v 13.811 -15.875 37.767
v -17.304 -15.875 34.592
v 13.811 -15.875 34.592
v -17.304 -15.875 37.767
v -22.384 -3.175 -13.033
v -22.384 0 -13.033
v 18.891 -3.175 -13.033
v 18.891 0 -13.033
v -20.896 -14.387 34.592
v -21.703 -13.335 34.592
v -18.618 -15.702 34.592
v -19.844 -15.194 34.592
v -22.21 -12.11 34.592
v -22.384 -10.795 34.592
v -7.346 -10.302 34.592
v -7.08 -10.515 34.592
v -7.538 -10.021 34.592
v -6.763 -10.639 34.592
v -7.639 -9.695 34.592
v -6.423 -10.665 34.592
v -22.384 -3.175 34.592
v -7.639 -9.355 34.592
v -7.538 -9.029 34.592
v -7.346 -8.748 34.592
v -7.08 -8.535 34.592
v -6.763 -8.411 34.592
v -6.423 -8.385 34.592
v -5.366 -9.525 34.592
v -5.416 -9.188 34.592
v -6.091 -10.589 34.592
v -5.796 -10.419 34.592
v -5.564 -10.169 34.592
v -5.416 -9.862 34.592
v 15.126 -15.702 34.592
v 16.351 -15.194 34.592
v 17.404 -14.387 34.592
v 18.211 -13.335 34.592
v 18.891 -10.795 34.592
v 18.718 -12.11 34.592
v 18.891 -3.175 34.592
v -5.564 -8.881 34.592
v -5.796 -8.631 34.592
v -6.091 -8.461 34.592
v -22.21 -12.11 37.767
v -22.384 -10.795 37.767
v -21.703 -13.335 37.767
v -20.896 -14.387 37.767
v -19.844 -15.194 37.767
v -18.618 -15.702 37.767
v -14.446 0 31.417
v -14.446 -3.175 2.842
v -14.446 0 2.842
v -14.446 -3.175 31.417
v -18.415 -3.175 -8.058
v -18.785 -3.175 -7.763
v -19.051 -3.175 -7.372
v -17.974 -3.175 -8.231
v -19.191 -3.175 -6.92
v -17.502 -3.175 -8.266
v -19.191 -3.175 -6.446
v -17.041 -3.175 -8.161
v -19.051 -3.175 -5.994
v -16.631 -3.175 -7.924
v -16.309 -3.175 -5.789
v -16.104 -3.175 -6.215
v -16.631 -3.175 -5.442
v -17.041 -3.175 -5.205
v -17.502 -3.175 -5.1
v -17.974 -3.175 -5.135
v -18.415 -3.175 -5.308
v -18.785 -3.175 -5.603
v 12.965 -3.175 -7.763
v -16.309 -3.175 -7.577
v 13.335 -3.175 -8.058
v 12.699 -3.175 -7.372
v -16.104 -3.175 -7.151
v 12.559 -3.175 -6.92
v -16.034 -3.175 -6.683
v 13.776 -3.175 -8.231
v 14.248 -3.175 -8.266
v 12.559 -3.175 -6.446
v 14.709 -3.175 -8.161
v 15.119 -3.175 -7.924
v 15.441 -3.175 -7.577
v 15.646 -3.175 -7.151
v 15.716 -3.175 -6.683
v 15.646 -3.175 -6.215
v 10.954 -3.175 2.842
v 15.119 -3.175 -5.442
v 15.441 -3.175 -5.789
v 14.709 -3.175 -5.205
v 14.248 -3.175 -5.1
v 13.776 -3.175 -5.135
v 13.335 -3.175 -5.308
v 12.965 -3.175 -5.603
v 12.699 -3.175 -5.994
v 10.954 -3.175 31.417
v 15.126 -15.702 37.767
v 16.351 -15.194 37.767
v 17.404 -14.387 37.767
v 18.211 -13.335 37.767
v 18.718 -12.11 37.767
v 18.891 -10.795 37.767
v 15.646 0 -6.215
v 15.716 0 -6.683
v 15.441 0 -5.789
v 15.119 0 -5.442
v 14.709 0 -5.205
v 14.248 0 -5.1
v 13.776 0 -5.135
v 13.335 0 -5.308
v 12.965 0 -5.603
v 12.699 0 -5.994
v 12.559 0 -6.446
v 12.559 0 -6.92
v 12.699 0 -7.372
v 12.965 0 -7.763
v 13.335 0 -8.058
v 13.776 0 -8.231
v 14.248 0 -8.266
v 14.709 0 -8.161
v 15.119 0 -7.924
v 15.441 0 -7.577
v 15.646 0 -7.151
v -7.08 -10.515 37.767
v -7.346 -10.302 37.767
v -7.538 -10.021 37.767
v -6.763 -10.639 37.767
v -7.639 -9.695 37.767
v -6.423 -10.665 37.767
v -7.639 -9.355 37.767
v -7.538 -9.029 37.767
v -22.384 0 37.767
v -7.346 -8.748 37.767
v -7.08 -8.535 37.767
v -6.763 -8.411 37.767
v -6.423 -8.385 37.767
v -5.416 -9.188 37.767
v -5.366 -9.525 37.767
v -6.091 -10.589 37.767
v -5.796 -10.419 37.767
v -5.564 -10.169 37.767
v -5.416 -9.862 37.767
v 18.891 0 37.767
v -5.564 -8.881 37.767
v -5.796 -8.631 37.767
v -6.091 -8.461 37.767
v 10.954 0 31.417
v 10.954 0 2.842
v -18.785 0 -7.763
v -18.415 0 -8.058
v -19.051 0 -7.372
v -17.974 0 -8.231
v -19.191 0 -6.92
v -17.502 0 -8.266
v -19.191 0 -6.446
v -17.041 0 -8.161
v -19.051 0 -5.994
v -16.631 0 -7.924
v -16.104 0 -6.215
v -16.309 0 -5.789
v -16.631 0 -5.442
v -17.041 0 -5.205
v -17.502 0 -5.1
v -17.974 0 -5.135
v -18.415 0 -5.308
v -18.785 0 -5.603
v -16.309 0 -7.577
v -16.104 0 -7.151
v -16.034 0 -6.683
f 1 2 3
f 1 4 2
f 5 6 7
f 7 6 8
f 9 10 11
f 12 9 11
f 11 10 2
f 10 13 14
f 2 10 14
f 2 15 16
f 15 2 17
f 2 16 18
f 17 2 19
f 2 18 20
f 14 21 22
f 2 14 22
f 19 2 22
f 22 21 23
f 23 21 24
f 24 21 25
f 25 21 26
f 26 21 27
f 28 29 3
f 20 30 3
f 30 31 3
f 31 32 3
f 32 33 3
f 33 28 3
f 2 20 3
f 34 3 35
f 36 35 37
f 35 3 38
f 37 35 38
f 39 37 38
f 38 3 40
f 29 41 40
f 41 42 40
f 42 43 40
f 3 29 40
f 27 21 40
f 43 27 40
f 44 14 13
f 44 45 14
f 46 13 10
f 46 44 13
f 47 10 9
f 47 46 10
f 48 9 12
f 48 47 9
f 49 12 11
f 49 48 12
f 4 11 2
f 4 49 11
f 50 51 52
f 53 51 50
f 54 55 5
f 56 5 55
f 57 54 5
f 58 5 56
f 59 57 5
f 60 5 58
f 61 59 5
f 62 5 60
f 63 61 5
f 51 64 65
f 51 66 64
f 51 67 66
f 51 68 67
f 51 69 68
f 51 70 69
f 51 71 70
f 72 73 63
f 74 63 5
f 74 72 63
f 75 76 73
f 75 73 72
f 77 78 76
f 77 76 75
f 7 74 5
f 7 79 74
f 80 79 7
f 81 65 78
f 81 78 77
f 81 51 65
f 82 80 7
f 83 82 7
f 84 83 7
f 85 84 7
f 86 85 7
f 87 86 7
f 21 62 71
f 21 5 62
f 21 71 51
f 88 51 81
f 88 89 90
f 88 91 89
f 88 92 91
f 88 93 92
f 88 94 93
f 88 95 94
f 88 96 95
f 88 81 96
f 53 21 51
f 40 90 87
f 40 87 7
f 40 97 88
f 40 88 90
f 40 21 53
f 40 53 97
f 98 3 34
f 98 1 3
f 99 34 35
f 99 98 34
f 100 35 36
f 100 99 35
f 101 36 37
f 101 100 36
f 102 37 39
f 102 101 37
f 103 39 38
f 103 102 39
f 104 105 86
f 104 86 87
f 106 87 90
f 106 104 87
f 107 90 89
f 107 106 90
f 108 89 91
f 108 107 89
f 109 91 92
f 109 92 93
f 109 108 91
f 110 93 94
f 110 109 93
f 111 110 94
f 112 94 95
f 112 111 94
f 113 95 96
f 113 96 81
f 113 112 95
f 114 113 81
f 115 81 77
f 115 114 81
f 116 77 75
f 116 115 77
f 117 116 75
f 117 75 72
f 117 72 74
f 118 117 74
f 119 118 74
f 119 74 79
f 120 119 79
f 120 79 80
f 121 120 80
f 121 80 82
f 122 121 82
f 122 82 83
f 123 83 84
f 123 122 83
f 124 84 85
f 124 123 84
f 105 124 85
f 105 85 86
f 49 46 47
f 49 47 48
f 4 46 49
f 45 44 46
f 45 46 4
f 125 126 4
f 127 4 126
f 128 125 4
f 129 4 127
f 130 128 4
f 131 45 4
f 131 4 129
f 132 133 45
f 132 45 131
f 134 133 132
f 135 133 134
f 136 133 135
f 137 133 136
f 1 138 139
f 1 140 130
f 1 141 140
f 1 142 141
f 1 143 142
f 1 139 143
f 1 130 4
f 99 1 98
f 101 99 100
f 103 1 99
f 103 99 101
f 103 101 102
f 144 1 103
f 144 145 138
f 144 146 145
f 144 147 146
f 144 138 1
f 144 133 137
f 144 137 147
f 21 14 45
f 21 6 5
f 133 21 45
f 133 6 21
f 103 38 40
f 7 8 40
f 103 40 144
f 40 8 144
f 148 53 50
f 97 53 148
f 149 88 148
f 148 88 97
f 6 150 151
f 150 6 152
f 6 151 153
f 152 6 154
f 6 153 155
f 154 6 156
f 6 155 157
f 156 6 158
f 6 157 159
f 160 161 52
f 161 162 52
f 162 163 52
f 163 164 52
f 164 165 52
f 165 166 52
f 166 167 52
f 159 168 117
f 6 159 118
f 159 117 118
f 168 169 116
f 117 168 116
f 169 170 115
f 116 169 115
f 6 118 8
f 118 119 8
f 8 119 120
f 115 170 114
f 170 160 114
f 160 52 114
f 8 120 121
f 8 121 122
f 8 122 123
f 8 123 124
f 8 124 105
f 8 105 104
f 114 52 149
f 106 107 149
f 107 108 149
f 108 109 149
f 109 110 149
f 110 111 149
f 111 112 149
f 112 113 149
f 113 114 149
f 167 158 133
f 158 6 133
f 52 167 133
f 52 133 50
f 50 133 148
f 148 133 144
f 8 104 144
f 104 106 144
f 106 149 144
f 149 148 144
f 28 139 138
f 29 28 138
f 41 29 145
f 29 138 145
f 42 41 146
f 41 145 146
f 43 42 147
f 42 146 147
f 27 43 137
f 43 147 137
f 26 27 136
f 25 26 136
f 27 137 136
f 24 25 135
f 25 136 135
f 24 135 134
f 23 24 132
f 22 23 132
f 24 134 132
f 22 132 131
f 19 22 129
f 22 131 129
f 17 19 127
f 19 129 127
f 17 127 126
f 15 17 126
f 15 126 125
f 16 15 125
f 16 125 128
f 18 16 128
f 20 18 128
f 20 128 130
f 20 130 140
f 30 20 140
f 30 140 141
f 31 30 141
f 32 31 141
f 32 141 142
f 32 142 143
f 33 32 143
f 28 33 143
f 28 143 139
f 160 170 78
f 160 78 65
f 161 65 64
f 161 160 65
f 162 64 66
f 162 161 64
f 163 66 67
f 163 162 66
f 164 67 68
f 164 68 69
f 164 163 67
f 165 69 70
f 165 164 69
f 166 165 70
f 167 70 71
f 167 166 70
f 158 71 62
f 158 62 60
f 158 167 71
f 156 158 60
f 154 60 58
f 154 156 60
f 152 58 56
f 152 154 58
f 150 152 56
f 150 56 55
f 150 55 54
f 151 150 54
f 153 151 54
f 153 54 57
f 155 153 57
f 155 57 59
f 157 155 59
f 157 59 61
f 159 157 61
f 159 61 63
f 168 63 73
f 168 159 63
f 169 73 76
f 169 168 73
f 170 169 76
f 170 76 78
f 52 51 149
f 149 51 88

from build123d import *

# Parameters (mm, degrees)
F0_W     = 41.275
F0_H     = 50.8
F0_R     = 1.5875
F1_DEPTH = 3.175
F2_W     = 41.275
F2_H     = 3.175
F3_DEPTH = 12.7
F5_W     = 25.4
F5_H     = 28.575
F6_DEPTH = 3.175
F4_R     = 1.143
F7_DEPTH = 25.4
F8_R     = 5.08
F9_R     = 5.08


with BuildPart() as f1:
    # F0 (on Front) → F1 (new body)
    with BuildSketch(Plane.XZ):
        with Locations((-1.74602, 12.366909)):
            Rectangle(F0_W, F0_H)
        with Locations((-17.62102, -6.683091)):
            Circle(F0_R, mode=Mode.SUBTRACT)
        with Locations((14.12898, -6.683091)):
            Circle(F0_R, mode=Mode.SUBTRACT)
    extrude(amount=F1_DEPTH)

    # F2 (on face) → F3 (join)
    with BuildSketch(Plane.XZ.offset(3.175)):
        with Locations((-1.74602, 36.179409)):
            Rectangle(F2_W, F2_H)
    extrude(amount=F3_DEPTH)

    # F5 (on face) → F6 (cut)
    with BuildSketch(Plane.XZ.offset(3.175)):
        with Locations((-1.74602, 17.129409)):
            Rectangle(F5_W, F5_H)
    extrude(amount=-F6_DEPTH, mode=Mode.SUBTRACT)

    # F4 (on face) → F7 (cut)
    with BuildSketch(Plane.XY.offset(37.766909)):
        with Locations((-6.50852, -9.525)):
            Circle(F4_R)
    extrude(amount=-F7_DEPTH, mode=Mode.SUBTRACT)

    # F8
    f8_edges = [f1.edges().sort_by_distance(p)[0] for p in [
        (-22.38352, -15.875, 36.179409),
    ]]
    fillet(f8_edges, radius=F8_R)

    # F9
    f9_edges = [f1.edges().sort_by_distance(p)[0] for p in [
        (18.89148, -15.875, 36.179409),
    ]]
    fillet(f9_edges, radius=F9_R)


solid = f1.part
